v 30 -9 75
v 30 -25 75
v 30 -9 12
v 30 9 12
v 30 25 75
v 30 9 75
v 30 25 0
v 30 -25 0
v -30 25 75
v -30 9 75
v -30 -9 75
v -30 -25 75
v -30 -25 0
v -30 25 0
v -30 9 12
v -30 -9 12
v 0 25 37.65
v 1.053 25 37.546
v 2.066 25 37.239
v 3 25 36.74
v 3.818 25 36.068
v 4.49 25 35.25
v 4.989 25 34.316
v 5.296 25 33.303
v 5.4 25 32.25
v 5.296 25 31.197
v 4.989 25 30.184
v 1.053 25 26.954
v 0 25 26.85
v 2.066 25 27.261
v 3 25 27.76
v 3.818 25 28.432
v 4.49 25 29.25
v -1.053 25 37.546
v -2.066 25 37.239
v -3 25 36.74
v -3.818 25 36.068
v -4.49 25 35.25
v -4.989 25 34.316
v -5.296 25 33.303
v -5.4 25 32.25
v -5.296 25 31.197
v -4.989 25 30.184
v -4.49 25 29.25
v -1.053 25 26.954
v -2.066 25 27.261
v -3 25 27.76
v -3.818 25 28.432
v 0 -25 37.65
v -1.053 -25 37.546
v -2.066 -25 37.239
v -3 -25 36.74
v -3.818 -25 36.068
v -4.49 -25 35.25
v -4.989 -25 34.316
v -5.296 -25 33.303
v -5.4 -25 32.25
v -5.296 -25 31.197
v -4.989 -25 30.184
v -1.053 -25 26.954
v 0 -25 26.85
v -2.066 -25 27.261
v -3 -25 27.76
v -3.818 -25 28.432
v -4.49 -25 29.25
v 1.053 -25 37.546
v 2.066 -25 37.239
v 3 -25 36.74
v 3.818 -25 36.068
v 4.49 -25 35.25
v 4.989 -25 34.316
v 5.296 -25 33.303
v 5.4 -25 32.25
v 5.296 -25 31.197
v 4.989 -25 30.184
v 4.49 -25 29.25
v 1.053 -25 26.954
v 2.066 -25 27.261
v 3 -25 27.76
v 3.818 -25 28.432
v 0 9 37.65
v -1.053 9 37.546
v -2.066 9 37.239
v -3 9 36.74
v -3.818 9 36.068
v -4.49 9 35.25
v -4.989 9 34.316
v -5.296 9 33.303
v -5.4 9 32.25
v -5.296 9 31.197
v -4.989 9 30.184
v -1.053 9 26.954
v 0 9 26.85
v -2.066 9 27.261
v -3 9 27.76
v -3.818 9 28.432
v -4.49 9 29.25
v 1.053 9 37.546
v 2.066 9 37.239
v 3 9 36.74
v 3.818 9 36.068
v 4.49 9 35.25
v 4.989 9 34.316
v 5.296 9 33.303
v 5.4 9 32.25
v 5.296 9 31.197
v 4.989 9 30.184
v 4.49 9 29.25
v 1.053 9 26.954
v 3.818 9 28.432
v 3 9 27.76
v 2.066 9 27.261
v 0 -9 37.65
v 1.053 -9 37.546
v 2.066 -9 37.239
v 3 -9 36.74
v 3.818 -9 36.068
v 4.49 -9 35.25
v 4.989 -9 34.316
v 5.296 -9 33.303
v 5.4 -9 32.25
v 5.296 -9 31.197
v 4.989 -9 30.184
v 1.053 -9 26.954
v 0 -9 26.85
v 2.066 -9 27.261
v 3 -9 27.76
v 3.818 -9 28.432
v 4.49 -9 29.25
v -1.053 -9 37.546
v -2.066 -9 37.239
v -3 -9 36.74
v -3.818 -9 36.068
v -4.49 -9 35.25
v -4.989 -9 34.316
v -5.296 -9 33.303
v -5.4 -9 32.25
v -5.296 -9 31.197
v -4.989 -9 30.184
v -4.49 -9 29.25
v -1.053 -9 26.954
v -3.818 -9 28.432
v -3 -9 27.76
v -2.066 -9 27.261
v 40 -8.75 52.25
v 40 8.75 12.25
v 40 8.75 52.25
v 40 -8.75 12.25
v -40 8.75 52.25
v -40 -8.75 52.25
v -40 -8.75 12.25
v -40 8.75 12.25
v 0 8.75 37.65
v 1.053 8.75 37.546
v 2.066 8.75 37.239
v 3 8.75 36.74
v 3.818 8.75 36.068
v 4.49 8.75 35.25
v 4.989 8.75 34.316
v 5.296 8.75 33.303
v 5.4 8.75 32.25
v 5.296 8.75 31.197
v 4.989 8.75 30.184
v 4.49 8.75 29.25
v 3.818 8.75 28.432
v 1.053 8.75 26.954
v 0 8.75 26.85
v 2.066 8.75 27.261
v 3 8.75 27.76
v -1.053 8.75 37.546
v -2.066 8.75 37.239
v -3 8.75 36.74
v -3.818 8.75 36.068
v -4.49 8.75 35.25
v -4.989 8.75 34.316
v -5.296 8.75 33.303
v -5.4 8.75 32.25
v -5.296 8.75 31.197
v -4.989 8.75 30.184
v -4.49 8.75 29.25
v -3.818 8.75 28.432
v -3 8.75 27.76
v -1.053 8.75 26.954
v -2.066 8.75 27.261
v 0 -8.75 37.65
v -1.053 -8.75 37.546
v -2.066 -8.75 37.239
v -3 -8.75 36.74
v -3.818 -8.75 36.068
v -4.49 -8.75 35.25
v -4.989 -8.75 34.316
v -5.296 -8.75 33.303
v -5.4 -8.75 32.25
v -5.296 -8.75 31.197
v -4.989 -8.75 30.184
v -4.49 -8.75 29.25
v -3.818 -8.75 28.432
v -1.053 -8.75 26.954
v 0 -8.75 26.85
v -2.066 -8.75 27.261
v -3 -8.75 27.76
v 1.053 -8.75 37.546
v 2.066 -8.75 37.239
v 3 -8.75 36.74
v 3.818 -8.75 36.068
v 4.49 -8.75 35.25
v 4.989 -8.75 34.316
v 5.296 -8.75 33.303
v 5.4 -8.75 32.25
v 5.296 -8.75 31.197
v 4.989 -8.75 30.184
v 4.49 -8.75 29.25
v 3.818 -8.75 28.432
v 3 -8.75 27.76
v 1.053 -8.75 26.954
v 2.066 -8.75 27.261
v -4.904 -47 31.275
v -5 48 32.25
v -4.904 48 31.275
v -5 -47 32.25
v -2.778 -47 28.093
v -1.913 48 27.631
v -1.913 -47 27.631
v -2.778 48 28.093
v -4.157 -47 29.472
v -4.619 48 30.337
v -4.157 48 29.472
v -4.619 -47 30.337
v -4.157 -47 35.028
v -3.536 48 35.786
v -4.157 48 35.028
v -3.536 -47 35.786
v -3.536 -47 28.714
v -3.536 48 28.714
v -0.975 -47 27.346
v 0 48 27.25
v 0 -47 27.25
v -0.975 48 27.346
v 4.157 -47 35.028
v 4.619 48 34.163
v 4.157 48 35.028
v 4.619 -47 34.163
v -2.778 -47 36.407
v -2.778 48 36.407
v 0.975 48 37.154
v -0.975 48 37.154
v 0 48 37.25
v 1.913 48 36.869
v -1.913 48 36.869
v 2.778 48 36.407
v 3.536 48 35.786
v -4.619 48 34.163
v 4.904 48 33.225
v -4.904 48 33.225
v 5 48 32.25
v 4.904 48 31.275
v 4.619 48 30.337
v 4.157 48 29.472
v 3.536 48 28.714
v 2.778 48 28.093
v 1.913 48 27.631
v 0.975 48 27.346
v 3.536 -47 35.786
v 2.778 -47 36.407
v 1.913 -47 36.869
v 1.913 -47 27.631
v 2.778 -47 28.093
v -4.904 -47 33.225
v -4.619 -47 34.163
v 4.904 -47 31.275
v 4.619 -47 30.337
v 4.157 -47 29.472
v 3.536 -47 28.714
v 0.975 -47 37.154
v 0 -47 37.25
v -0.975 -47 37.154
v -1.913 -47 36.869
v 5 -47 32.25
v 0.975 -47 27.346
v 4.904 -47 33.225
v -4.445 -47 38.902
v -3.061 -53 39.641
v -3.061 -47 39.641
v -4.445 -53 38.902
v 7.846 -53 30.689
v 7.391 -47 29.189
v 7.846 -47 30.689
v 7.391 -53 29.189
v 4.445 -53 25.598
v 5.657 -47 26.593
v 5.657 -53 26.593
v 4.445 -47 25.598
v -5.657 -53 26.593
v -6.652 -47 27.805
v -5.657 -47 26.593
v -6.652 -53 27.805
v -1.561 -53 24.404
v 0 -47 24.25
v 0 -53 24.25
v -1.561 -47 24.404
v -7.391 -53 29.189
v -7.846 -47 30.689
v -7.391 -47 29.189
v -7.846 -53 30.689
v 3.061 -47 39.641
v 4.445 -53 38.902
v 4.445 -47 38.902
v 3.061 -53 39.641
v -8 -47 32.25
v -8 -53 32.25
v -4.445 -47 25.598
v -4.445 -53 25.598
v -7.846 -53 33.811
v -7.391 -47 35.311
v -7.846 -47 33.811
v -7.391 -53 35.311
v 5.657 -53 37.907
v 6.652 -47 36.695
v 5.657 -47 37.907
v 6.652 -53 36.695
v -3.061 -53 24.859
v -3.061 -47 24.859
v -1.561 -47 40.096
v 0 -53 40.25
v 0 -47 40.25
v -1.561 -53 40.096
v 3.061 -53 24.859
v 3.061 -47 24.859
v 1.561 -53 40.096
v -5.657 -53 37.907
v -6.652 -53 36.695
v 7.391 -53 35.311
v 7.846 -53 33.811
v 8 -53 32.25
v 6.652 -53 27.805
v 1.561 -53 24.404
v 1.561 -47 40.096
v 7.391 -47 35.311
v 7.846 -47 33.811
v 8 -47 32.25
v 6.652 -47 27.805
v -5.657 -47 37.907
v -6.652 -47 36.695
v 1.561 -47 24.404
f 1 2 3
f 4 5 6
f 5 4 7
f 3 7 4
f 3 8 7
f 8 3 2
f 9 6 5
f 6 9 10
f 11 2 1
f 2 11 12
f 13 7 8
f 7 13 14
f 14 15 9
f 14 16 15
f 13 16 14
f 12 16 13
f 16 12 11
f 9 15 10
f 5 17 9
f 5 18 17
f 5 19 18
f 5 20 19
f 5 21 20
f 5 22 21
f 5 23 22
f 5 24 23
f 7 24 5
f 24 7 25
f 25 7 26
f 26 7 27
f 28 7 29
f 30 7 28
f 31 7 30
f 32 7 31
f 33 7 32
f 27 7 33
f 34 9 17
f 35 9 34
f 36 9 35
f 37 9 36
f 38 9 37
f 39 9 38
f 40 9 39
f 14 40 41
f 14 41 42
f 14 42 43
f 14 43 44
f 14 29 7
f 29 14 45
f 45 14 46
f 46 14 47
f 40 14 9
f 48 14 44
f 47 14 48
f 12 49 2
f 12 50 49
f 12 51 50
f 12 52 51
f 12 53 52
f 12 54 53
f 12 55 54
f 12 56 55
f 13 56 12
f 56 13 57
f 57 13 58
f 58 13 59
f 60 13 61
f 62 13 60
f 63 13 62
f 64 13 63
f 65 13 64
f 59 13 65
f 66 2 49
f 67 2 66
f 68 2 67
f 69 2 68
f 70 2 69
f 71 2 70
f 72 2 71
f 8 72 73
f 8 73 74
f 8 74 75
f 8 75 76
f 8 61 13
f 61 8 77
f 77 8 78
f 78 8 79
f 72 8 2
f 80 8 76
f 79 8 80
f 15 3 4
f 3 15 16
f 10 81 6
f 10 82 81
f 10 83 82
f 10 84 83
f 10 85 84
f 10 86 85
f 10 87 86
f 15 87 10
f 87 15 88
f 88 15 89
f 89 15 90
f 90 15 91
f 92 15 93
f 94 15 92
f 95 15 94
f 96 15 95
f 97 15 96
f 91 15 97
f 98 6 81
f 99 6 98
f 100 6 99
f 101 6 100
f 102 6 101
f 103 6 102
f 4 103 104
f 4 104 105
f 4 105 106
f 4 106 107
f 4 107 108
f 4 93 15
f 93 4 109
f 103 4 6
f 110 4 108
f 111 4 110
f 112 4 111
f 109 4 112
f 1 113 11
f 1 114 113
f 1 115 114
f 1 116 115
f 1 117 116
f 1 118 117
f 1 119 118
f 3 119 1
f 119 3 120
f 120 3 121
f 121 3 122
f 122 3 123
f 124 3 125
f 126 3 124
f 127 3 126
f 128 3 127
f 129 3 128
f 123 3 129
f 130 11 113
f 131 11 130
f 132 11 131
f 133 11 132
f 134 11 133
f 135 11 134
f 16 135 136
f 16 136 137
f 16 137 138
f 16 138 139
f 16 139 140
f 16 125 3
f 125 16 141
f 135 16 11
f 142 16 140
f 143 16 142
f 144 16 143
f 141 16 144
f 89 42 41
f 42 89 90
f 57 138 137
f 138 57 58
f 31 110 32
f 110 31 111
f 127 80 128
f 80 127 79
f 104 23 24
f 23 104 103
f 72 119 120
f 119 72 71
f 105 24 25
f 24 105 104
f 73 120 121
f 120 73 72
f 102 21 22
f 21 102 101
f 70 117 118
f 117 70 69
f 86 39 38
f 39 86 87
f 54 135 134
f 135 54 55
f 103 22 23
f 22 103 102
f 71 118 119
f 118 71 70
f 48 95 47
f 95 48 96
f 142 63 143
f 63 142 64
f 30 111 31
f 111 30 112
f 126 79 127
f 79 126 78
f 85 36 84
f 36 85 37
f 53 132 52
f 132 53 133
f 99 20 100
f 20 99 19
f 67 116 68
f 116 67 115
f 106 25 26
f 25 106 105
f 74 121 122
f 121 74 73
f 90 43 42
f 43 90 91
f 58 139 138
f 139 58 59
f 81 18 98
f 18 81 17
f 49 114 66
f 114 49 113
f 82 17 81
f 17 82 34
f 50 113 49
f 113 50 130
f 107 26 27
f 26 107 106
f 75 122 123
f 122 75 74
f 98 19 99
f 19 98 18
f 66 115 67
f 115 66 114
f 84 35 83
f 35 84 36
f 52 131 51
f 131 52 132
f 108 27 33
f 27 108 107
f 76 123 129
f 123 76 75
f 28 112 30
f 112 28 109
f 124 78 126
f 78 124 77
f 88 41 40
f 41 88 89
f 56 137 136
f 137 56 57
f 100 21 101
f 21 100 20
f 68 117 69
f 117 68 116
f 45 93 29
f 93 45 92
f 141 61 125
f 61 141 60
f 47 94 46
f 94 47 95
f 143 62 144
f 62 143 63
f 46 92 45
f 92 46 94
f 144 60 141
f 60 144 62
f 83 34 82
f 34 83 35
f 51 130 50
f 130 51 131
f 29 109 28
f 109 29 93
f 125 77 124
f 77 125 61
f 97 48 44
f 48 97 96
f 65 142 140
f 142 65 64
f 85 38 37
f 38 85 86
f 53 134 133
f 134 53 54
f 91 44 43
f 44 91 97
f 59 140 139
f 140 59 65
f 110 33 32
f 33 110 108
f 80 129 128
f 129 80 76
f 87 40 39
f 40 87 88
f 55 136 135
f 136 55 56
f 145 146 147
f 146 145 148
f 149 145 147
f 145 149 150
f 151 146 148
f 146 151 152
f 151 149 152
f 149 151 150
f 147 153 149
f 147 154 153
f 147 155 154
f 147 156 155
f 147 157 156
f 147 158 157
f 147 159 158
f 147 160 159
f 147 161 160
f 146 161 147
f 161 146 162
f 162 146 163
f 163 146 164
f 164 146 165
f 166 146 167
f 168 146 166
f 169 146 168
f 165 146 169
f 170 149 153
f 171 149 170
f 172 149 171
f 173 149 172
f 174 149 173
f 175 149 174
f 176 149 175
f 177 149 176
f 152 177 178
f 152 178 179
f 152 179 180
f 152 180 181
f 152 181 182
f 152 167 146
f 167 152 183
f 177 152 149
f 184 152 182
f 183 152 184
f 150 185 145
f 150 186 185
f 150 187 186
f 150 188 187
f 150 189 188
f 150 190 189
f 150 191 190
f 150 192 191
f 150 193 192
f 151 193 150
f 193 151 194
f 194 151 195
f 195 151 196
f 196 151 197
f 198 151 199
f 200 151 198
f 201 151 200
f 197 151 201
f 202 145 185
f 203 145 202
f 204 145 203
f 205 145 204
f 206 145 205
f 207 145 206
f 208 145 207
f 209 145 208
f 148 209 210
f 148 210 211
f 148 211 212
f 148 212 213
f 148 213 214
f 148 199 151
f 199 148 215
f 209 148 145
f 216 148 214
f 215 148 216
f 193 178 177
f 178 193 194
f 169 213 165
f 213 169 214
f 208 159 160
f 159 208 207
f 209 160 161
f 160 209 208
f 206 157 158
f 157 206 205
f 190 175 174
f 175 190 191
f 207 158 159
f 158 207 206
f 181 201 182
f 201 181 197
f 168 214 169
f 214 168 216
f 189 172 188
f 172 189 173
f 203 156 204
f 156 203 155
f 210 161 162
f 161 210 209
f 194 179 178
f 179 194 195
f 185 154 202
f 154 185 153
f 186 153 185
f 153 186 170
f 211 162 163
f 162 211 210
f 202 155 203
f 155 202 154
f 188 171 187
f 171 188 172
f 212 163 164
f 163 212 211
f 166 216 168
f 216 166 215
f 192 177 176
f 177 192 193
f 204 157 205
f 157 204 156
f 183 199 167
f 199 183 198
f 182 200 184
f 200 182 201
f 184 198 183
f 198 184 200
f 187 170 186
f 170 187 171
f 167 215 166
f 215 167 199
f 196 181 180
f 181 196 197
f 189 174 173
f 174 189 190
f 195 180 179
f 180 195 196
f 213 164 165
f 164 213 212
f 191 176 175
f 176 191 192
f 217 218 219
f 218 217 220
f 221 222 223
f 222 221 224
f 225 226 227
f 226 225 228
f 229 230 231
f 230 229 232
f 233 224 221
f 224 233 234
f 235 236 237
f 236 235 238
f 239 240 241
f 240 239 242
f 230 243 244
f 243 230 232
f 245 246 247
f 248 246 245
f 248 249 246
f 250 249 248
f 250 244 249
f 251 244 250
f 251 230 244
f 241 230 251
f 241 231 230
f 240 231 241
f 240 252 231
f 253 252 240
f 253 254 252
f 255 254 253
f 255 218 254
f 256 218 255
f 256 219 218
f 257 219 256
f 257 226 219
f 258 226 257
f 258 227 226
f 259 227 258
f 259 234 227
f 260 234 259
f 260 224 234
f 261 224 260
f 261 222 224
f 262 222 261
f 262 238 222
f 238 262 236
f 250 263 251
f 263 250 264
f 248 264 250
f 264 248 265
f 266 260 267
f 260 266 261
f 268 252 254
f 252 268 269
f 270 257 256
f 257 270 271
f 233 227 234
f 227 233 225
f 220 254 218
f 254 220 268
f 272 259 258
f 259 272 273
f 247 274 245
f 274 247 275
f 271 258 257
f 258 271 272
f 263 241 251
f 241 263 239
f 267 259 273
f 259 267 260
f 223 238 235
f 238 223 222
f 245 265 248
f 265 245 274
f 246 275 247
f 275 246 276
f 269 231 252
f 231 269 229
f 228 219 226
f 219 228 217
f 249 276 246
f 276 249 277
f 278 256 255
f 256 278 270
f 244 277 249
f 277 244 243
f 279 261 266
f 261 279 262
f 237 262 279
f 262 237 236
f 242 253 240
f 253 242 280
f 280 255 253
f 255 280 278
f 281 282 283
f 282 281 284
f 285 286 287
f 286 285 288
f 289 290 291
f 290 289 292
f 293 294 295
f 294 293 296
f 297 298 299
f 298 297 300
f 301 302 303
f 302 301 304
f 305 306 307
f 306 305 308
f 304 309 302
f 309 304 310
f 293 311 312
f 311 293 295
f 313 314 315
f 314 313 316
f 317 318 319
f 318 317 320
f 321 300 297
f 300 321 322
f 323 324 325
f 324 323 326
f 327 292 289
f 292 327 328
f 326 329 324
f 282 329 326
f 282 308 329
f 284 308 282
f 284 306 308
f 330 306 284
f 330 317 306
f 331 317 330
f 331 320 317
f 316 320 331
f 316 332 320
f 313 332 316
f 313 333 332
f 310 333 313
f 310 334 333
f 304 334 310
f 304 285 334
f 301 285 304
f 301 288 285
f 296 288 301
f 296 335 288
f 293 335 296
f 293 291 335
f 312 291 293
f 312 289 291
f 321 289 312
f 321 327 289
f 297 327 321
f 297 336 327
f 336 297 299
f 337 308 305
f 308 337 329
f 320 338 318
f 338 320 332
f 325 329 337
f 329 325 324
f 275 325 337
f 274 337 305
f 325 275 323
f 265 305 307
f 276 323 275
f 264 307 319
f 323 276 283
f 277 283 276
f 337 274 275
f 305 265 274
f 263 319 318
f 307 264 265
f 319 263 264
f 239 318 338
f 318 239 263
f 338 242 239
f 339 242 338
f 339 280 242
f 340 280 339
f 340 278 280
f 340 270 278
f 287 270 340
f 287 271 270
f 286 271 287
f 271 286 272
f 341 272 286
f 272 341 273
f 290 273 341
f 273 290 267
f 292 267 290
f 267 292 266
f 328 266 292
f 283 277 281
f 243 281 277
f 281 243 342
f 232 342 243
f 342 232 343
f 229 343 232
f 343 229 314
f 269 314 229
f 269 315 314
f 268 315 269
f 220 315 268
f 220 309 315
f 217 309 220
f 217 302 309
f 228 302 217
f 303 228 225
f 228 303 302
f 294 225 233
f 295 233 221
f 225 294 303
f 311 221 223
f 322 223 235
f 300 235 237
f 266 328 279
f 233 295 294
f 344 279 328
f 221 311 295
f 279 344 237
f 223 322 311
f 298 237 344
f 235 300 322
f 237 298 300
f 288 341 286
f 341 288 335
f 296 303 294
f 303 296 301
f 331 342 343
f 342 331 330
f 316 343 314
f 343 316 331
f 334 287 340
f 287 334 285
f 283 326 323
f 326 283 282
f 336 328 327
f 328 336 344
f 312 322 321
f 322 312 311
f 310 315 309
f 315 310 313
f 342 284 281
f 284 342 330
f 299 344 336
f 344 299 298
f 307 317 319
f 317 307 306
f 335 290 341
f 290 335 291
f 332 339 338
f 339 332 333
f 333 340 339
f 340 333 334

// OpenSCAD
$fn = 32;

// ------------------------------------------------------------------------
// Clevis joint: 60 mm clevis, pin d10
// Every part is its own module, assembly() places them once.
// ------------------------------------------------------------------------

// --- part 1 ---
module clevis() {
  difference() {
    translate([-30, -25, 0]) cube([60, 50, 75]);
    translate([-31, -9, 12]) cube([62, 18, 64]);
    translate([0, 0, 32.25]) rotate([90, 0, 0]) cylinder(h = 52, d = 10.8, center = true);
  }
}

// --- part 2 ---
module eye() {
  difference() {
    translate([-40, -8.75, 0]) cube([80, 17.5, 40]);
    translate([0, 0, 20]) rotate([90, 0, 0]) cylinder(h = 19.5, d = 10.8, center = true);
  }
}

// --- part 3 ---
module pin() {
  rotate([0, 90, 0]) cylinder(h = 96, d = 10, center = true);
  translate([-53, 0, 0]) rotate([0, 90, 0]) cylinder(h = 6, d = 16);
}

// --- assembly ---
module assembly() {
  translate([0, 0, 0]) rotate([0, 0, 0]) clevis();
  translate([0, 0, 12.25]) rotate([0, 0, 0]) eye();
  translate([0, 0, 32.25]) rotate([0, 0, 90]) pin();
}

assembly();
